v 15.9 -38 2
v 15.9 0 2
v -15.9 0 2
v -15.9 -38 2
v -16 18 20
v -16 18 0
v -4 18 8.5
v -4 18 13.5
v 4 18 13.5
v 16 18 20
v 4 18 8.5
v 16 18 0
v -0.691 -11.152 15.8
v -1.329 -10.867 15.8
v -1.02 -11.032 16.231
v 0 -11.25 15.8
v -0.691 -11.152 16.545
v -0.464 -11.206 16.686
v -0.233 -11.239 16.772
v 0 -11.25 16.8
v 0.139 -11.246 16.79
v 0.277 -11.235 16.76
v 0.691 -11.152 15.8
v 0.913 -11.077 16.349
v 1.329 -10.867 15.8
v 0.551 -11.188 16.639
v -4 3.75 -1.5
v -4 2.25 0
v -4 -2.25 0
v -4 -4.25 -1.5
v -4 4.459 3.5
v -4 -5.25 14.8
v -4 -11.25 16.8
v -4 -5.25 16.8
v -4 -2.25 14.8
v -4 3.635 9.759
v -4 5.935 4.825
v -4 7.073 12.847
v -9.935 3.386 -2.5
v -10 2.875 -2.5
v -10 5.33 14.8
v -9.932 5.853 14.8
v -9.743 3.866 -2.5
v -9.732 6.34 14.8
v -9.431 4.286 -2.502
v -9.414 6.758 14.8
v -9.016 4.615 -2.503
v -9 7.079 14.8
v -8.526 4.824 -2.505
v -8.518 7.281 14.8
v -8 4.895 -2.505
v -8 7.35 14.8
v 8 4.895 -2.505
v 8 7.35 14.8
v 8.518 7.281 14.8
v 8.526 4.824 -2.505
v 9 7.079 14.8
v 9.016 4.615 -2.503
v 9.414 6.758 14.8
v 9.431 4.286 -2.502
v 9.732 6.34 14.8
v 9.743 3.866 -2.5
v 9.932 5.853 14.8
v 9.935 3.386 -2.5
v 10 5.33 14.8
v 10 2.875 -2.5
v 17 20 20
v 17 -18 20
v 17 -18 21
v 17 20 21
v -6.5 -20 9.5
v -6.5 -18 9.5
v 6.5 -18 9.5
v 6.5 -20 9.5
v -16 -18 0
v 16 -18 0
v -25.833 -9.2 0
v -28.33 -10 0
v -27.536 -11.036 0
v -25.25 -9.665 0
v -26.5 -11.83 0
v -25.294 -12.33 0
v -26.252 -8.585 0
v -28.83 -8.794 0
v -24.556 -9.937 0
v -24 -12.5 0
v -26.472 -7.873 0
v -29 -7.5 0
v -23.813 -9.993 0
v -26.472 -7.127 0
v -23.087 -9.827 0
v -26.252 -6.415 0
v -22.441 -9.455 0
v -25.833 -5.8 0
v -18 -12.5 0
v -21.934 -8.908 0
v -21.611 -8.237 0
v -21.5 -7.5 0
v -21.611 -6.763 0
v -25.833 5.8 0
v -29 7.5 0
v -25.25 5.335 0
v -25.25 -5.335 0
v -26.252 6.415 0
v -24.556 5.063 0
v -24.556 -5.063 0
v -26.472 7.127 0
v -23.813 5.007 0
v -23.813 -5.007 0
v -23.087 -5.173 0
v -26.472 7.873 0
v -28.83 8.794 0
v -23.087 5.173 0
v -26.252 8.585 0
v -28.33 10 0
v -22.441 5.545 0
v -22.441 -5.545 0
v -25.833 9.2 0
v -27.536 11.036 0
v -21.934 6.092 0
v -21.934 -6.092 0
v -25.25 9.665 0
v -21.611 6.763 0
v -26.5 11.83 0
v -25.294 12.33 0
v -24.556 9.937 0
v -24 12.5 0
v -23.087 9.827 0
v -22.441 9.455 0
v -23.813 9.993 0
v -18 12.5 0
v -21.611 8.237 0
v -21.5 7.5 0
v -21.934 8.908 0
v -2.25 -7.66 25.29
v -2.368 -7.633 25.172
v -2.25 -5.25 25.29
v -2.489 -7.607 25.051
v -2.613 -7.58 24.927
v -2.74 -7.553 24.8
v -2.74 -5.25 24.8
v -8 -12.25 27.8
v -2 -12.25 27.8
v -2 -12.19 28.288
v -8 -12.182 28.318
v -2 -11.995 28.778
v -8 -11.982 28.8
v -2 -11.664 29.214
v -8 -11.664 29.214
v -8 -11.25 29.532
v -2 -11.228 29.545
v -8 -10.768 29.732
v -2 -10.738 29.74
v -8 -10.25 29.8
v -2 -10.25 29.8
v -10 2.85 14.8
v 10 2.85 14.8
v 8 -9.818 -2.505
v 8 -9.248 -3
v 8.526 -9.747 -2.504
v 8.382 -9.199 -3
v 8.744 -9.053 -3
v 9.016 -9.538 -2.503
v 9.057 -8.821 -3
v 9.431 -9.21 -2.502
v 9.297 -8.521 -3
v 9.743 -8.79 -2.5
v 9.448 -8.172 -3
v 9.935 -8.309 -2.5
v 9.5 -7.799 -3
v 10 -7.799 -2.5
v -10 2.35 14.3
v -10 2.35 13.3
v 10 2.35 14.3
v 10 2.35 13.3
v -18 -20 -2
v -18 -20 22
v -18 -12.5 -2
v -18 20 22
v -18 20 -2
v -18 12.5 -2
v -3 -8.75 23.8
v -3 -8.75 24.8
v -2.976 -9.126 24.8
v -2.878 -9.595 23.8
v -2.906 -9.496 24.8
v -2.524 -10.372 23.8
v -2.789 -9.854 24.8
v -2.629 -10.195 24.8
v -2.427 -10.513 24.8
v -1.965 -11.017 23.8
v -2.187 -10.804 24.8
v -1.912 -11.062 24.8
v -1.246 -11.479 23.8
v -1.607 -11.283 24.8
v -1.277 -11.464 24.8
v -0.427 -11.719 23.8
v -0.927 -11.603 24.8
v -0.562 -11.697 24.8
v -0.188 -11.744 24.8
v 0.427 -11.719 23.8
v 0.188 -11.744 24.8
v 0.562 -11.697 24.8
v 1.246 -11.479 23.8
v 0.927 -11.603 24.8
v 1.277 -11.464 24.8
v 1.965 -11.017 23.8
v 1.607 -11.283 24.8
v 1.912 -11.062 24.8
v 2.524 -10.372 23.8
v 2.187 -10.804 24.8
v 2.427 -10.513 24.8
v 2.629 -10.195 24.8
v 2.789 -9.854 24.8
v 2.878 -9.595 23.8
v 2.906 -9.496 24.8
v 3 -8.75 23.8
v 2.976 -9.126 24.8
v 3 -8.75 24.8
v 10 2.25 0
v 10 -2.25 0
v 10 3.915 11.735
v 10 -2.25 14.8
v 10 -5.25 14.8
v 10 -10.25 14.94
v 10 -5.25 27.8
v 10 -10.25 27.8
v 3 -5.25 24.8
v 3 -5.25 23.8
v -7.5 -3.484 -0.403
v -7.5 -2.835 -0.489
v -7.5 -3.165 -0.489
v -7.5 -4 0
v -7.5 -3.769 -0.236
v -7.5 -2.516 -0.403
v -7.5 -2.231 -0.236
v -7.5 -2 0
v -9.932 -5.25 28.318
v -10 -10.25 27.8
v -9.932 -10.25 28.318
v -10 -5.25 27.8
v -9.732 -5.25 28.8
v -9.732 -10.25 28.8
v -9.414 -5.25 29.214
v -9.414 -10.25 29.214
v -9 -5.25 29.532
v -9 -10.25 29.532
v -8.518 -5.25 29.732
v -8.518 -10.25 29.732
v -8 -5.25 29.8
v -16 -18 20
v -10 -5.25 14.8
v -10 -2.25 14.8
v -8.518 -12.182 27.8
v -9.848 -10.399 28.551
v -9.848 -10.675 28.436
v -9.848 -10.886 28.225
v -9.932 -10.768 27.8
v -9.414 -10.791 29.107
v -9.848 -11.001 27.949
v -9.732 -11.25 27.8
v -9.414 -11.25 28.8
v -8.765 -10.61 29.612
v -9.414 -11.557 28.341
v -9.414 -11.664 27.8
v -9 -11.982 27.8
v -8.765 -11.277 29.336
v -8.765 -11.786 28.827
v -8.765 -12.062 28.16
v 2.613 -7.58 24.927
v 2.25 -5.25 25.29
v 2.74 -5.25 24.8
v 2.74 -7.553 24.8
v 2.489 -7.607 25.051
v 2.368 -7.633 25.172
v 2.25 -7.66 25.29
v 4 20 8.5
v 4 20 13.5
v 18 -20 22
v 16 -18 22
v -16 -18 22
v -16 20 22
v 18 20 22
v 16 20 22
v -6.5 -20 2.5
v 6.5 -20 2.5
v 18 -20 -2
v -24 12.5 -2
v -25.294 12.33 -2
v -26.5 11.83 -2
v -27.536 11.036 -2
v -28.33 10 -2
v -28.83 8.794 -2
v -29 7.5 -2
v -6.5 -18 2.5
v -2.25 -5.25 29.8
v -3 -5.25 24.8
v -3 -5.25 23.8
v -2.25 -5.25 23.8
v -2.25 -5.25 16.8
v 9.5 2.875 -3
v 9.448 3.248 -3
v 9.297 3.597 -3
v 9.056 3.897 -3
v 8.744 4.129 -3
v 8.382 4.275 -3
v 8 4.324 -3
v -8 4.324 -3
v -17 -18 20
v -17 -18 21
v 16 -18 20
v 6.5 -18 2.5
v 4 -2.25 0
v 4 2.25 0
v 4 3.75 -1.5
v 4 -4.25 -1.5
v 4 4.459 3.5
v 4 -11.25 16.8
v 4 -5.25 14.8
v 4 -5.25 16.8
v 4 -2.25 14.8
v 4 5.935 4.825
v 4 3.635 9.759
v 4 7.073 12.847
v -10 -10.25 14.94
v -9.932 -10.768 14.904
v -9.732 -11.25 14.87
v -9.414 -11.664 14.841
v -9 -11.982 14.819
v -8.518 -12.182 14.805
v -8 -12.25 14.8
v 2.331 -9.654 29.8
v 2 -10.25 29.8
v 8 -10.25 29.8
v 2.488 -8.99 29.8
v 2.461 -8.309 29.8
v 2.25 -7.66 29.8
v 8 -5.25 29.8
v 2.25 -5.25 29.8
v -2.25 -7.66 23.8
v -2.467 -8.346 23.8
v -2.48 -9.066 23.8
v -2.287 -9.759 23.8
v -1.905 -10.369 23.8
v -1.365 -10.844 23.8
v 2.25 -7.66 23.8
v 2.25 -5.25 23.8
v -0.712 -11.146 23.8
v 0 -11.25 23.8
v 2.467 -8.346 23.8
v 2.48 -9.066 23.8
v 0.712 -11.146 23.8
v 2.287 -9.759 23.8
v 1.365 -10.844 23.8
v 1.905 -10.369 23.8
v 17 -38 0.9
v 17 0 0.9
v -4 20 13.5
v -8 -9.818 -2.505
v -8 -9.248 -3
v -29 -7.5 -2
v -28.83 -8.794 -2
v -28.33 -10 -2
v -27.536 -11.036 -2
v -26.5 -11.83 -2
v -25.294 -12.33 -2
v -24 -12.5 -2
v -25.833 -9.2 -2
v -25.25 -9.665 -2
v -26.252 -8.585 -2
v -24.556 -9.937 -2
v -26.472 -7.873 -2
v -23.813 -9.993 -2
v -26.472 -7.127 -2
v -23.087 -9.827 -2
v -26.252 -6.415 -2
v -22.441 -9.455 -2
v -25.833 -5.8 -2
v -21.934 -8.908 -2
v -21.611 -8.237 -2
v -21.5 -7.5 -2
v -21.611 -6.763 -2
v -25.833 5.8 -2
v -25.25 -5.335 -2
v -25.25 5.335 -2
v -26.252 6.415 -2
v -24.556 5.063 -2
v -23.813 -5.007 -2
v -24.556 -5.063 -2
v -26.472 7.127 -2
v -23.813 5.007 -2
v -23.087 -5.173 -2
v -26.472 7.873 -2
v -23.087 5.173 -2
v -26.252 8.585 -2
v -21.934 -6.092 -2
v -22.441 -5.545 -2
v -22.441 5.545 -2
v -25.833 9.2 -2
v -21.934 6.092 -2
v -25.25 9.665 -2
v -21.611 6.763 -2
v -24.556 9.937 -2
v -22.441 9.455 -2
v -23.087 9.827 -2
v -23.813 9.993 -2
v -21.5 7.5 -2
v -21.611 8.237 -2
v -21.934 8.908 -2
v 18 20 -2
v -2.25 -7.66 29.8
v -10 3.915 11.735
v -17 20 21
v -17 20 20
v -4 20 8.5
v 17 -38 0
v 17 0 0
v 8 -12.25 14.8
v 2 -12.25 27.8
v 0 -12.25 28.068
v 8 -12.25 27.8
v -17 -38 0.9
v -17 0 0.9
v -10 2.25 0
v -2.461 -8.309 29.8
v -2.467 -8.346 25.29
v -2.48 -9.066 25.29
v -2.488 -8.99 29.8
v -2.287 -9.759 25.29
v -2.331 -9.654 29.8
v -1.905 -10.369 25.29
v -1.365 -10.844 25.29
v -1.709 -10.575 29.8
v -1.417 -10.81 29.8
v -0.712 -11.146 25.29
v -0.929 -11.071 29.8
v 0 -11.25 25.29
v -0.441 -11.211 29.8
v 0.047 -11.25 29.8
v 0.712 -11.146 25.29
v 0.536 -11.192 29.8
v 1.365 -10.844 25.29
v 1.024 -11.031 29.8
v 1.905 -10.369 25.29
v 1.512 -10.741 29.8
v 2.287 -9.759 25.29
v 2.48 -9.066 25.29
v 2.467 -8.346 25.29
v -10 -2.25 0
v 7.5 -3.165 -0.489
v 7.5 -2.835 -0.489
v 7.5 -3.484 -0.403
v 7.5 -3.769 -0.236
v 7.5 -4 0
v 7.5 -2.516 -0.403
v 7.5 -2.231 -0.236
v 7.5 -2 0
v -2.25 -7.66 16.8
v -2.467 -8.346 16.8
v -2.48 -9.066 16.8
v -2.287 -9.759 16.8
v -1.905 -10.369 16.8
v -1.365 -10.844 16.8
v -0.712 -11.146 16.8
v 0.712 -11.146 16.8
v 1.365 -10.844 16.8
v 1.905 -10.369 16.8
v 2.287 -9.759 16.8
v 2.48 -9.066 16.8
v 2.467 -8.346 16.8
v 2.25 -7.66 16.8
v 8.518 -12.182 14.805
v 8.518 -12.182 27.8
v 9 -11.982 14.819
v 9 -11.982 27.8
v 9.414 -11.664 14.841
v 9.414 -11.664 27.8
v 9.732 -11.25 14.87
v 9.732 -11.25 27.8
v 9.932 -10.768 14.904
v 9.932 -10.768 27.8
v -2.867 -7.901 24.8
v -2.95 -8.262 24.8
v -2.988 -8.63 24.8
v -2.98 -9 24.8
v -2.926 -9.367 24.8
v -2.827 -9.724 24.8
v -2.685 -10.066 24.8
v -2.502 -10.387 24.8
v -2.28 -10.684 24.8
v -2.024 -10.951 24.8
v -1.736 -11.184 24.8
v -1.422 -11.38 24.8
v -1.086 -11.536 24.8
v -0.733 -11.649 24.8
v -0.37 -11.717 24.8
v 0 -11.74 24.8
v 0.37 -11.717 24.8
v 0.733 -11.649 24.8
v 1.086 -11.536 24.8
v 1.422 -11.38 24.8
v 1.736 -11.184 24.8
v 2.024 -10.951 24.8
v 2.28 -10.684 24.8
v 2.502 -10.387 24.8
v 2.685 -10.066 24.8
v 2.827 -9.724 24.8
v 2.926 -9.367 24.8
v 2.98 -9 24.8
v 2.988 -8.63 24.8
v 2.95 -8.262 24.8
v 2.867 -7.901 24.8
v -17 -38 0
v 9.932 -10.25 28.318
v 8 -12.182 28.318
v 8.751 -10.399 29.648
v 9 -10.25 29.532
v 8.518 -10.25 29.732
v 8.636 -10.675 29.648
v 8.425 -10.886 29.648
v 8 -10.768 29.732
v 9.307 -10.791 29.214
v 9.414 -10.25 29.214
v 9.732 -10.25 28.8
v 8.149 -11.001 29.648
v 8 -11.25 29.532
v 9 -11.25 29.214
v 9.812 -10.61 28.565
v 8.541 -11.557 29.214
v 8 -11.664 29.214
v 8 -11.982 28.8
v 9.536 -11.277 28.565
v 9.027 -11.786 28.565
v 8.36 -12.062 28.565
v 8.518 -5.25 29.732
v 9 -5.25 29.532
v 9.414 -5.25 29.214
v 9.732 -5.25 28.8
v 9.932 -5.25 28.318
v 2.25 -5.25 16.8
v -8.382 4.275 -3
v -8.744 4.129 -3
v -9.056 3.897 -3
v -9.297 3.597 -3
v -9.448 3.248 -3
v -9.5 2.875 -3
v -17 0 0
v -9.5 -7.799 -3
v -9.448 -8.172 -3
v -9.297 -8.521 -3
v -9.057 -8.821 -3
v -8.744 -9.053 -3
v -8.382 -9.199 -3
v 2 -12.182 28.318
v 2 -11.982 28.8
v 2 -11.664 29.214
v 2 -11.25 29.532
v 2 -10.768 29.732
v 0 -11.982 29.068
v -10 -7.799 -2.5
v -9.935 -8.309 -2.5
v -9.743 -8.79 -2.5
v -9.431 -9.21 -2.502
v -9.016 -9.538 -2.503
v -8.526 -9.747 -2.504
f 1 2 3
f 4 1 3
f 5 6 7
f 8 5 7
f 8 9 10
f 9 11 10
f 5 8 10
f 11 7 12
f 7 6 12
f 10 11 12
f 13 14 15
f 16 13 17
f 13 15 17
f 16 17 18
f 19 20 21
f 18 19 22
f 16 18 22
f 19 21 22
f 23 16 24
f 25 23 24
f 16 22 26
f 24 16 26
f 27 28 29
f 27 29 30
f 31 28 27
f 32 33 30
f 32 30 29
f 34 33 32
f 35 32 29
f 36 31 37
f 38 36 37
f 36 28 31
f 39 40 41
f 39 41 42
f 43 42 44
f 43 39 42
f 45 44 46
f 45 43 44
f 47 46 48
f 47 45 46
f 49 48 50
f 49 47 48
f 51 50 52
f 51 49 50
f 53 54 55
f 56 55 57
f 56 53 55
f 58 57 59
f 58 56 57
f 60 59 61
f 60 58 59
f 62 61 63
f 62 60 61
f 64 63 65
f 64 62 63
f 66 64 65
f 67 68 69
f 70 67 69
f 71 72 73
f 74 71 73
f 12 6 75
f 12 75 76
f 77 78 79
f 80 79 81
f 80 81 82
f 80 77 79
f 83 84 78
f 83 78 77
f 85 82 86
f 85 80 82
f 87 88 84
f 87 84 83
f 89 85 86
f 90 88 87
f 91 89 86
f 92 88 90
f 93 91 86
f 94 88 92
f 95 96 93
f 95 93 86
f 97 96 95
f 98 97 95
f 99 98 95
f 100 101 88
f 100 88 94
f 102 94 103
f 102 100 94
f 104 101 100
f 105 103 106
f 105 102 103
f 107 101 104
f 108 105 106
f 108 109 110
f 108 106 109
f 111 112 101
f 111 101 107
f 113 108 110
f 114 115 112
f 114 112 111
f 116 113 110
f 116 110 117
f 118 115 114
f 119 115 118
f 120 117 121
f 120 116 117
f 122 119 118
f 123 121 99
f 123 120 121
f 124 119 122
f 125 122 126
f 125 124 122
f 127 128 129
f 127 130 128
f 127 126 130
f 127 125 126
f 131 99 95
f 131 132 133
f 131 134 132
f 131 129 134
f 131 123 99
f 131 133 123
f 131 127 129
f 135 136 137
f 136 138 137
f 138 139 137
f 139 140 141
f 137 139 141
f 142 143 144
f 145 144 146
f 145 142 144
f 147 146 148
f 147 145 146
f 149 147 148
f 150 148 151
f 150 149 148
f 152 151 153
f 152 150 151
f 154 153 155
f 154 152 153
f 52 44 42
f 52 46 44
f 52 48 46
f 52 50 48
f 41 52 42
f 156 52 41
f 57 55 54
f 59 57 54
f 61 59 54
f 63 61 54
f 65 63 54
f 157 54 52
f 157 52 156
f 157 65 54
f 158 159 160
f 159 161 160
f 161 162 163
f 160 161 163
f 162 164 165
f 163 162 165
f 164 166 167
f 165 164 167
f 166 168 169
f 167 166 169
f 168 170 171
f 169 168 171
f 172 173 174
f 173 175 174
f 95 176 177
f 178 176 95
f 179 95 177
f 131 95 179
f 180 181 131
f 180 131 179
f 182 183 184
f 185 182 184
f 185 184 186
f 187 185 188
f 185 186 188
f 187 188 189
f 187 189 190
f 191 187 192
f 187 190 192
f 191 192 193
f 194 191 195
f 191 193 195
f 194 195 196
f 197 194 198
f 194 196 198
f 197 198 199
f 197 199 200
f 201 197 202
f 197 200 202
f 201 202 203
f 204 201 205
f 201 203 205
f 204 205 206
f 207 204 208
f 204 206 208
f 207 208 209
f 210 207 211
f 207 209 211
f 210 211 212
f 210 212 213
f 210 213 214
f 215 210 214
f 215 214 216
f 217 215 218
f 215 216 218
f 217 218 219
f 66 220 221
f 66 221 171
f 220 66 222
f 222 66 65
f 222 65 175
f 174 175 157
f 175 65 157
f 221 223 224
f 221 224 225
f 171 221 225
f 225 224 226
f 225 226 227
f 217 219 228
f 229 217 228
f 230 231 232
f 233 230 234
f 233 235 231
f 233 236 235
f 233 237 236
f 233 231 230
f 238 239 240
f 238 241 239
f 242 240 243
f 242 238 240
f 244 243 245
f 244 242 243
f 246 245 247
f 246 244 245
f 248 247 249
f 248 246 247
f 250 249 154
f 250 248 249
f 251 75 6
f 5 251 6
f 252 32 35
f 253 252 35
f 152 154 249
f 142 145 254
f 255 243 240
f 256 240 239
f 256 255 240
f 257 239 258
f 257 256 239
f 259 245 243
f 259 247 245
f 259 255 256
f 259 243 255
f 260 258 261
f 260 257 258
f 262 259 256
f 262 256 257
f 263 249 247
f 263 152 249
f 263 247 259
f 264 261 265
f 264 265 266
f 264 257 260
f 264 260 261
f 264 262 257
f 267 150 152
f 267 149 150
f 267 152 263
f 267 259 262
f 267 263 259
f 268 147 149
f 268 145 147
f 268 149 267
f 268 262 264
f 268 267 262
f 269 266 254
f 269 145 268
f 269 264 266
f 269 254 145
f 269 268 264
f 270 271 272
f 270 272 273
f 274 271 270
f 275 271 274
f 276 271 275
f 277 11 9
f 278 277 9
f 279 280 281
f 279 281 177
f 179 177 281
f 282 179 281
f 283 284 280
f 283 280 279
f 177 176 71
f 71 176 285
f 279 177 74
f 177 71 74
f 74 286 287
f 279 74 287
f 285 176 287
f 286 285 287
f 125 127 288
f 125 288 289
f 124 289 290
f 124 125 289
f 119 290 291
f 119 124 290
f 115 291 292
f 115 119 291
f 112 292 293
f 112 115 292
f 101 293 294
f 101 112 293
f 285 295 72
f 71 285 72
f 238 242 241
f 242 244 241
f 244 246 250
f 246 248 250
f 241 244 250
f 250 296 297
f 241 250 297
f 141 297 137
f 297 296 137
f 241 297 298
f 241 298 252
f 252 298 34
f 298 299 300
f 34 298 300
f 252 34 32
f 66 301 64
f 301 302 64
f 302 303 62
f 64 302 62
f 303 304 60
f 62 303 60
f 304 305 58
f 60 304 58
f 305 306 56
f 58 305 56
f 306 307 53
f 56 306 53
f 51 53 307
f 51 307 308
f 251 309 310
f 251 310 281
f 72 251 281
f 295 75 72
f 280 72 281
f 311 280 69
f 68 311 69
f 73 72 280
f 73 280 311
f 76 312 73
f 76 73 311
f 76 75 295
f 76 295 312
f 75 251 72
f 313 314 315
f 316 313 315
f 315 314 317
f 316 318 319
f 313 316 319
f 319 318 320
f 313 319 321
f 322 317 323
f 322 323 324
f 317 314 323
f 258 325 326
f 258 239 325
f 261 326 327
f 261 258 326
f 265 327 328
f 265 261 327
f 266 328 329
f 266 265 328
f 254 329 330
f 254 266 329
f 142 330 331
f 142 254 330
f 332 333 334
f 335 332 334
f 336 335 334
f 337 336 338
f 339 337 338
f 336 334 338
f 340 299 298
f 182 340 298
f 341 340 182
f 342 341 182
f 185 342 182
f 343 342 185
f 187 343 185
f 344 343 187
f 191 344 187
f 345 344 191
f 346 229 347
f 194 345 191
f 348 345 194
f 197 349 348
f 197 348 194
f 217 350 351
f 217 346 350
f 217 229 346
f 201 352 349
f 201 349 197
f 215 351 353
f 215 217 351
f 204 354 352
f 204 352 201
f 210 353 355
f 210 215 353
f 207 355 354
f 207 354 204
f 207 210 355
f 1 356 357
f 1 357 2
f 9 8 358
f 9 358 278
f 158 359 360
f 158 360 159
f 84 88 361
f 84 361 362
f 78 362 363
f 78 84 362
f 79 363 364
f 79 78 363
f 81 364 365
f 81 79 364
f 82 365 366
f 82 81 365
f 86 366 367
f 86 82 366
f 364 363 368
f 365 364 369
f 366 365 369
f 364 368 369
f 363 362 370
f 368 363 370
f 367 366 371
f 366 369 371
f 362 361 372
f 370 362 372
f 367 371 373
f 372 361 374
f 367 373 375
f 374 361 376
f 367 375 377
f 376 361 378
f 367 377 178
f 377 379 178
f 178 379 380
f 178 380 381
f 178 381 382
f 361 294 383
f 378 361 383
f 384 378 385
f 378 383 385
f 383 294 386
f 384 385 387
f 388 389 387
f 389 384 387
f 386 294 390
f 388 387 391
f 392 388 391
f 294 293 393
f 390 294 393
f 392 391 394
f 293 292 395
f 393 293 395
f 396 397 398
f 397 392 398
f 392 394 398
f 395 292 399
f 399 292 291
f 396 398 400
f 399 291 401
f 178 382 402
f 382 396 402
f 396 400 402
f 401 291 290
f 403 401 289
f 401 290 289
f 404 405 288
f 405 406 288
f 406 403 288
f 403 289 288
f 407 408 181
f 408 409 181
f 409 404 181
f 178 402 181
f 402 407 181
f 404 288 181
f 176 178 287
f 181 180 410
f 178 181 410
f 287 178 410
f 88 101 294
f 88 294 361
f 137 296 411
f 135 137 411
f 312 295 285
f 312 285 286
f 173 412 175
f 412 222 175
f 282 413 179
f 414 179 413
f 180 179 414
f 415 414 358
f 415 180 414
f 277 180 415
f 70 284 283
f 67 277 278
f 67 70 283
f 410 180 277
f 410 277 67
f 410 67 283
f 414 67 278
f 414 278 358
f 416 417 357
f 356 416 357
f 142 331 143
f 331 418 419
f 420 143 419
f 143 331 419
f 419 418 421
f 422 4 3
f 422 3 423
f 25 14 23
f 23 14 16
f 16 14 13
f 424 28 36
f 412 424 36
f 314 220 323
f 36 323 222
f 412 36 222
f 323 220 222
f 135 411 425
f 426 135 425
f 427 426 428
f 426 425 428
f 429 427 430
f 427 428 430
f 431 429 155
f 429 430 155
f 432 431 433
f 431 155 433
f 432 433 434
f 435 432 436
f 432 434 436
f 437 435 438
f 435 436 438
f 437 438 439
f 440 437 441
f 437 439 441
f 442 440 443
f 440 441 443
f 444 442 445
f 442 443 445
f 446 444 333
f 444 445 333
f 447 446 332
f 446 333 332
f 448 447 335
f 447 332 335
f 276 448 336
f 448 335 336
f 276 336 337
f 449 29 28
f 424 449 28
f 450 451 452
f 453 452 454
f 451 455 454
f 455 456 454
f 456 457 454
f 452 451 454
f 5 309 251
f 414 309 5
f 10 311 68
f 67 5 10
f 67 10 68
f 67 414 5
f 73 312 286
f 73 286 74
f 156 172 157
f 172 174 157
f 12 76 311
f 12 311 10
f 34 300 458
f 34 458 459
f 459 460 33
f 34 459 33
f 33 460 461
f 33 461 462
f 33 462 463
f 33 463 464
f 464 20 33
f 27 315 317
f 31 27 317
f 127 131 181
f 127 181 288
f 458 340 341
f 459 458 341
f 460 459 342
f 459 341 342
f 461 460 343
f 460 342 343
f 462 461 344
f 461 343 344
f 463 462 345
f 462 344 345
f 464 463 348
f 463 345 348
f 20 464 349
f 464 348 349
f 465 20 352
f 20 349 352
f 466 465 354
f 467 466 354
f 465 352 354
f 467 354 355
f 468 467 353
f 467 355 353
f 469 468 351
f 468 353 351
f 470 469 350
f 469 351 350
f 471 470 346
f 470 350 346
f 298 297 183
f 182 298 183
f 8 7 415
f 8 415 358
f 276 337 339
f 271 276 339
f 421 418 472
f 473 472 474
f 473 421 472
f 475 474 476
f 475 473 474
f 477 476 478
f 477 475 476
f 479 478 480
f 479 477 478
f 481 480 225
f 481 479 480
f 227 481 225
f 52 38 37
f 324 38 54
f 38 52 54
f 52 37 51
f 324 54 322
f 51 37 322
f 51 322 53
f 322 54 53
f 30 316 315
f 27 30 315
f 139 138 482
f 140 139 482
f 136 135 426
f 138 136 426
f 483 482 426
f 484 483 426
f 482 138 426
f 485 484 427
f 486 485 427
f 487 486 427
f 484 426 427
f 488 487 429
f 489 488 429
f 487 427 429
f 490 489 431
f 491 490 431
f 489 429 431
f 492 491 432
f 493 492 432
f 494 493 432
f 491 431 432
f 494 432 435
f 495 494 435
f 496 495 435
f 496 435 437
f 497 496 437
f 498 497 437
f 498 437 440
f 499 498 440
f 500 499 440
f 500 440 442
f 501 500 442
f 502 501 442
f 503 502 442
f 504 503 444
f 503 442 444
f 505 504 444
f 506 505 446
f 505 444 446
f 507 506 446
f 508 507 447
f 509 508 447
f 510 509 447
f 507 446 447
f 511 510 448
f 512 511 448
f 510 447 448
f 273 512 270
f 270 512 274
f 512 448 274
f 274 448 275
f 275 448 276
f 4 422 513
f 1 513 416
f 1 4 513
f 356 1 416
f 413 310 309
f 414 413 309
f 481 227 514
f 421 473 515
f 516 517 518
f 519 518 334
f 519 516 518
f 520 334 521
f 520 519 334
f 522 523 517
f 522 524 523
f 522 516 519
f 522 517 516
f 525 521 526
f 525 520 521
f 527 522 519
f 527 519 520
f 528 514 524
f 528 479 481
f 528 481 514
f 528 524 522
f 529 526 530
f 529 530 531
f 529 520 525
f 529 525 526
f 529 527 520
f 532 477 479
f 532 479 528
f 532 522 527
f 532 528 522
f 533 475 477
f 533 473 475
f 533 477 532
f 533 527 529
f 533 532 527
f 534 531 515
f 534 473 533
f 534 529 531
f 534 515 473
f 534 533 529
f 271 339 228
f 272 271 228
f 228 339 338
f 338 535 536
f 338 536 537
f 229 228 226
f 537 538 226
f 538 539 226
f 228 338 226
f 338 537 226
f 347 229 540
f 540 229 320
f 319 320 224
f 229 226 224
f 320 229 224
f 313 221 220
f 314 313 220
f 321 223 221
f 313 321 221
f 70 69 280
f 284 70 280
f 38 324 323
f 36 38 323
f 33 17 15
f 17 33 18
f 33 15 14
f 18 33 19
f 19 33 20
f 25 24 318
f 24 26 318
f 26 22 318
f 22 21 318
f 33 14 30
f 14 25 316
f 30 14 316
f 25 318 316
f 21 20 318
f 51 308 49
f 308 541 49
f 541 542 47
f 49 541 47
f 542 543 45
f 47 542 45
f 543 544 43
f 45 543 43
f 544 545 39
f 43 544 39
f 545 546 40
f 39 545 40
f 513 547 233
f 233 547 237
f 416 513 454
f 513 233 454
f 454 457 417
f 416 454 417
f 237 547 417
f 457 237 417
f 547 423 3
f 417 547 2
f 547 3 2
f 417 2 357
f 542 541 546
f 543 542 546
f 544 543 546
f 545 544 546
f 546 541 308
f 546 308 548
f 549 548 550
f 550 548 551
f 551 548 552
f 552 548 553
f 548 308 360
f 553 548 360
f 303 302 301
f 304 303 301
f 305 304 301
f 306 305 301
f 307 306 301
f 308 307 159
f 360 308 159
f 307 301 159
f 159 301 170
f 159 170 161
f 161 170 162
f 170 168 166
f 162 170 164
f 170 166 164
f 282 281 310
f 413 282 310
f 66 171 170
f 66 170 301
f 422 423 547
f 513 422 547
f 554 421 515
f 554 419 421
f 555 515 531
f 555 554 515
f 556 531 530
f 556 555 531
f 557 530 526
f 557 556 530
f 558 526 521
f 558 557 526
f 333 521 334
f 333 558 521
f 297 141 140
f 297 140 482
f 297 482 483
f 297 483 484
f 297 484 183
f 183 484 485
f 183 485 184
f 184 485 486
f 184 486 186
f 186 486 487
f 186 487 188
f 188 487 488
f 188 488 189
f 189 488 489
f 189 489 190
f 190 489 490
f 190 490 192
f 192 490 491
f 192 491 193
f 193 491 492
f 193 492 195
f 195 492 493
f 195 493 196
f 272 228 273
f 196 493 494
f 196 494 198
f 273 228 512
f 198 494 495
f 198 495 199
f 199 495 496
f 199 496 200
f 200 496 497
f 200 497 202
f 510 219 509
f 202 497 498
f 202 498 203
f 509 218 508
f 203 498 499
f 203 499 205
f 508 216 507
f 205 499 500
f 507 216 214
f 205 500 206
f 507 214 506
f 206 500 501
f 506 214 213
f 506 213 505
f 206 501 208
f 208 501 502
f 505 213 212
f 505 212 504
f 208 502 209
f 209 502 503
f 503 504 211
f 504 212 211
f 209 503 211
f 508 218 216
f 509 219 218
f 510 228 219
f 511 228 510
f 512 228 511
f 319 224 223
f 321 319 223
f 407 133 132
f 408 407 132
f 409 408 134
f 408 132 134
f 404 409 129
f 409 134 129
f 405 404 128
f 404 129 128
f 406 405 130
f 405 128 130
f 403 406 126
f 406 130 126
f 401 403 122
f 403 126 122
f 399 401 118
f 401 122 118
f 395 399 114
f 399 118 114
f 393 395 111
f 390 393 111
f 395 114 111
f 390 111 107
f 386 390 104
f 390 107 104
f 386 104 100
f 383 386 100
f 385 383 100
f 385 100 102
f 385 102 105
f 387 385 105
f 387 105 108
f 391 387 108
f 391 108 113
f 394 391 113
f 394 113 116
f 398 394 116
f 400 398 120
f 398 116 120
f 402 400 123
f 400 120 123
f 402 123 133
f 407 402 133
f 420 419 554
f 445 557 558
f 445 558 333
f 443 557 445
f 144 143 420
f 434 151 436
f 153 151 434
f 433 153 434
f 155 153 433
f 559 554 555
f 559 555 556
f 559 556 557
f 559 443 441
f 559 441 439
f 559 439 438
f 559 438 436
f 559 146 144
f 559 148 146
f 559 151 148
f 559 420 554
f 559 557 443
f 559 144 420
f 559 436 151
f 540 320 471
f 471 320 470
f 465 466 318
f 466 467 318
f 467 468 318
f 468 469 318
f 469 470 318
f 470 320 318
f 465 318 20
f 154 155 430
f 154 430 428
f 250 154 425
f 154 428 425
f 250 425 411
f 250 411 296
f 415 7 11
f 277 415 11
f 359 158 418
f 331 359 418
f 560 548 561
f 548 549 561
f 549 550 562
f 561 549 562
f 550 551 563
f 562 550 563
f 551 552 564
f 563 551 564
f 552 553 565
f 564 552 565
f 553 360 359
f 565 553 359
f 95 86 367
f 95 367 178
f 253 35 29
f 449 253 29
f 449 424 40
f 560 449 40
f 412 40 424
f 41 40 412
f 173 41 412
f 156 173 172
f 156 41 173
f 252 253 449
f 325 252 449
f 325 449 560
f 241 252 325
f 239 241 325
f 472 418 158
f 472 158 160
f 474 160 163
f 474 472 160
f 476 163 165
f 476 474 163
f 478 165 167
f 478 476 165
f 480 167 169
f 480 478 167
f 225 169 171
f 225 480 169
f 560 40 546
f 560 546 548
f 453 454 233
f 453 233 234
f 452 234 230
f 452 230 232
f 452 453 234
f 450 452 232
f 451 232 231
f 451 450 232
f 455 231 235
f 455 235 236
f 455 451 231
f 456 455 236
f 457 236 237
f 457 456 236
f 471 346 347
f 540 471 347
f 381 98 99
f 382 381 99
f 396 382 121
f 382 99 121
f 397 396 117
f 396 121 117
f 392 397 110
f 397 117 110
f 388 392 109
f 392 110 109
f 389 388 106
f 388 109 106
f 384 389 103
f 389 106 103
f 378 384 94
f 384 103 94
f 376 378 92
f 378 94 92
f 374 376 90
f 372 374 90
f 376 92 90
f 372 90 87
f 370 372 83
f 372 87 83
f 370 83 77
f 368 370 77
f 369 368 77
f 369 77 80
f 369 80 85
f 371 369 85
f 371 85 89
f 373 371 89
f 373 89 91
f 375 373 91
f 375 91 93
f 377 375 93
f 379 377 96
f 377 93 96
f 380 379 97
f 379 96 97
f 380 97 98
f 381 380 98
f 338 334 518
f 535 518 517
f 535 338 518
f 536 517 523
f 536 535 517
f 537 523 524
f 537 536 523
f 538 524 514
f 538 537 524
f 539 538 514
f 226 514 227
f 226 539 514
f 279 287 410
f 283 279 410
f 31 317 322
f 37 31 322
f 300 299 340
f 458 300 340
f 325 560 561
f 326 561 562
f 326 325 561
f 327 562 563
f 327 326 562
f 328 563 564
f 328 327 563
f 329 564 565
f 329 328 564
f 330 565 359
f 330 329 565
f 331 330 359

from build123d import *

# Parameters (mm, degrees)
PAD_DEPTH       = 10
POCKET_DEPTH    = 14
POCKET001_DEPTH = 1
POCKET002_DEPTH = 4
FILLET_R        = 2
CHAMFER_SIZE    = 0.5
CHAMFER001_SIZE = 0.49
SKETCH005_W     = 32
SKETCH005_H     = 36
PAD001_DEPTH    = 22
THICKNESS_T     = 2
SKETCH006_W     = 13
SKETCH006_H     = 7
POCKET003_DEPTH = 20.001
SKETCH007_W     = 8
SKETCH007_H     = 5
POCKET004_DEPTH = 20.001
POCKET005_DEPTH = 38
SKETCH009_R     = 2.5
PAD002_DEPTH    = 2
PAD003_DEPTH    = 38
PAD004_DEPTH    = 7.5


with BuildPart() as body:
    # Sketch → Pad (new body, symmetric)
    with BuildSketch(Plane.YZ):
        Polygon((-2.25, 14.8), (-2.25, 0), (2.25, 0), (3.915089, 11.734911), (2.35, 13.3), (2.35, 14.3), (2.85, 14.8), (4.35, 14.8), (7.35, 14.8), (4.824324, -3), (-9.748373, -3), (-12.25, 14.8), (-12.25, 29.8), (-5.25, 29.8), (-5.25, 14.8), align=None)
    extrude(amount=PAD_DEPTH, both=True)

    # Sketch001 (on Face13 of Pad) → Pocket (cut)
    with BuildSketch(Plane(origin=(0, 0, 29.8), x_dir=(0, -1, 0), z_dir=(0, 0, 1))):
        with BuildLine():
            Line((3.160275, 2.25), (3.160275, -2.25))
            Line((3.160275, -2.25), (7.660275, -2.25))
            ThreePointArc((7.660275, -2.25), (11.25, 0), (7.660275, 2.25))
            Line((7.660275, 2.25), (3.160275, 2.25))
        make_face()
    extrude(amount=-POCKET_DEPTH, mode=Mode.SUBTRACT)

    # Sketch002 (on Face13 of Pad) → Pocket001 (cut)
    with BuildSketch(Plane(origin=(0, 0, 24.8), x_dir=(0, -1, 0), z_dir=(0, 0, 1))):
        with BuildLine():
            Line((0.75, 3), (0.75, -3))
            Line((0.75, -3), (8.75, -3))
            ThreePointArc((8.75, -3), (11.75, 0), (8.75, 3))
            Line((8.75, 3), (0.75, 3))
        make_face()
    extrude(amount=-POCKET001_DEPTH, mode=Mode.SUBTRACT)

    # Sketch003 → Pocket002 (cut, symmetric)
    with BuildSketch(Plane.YZ):
        Polygon((12.35, 17.585771), (1.25, 7.617879), (-1.25, 7.617879), (-1.25, 16.8), (-11.25, 16.8), (-4.25, -1.5), (3.75, -1.5), (4.459459, 3.5), (12.35, 10.585771), align=None)
    extrude(amount=POCKET002_DEPTH, both=True, mode=Mode.SUBTRACT)

    # Fillet
    fillet_edges = [body.edges().sort_by_distance(p)[0] for p in [
        (10, -10.999187, 5.9),
        (10, -12.25, 22.3),
        (10, -8.75, 29.8),
        (0, -12.25, 29.8),
        (-10, -8.75, 29.8),
        (-10, -12.25, 22.3),
        (-10, -10.999187, 5.9),
        (10, 6.087162, 5.9),
        (-10, 6.087162, 5.9),
    ]]
    fillet(fillet_edges, radius=FILLET_R)

    # Chamfer
    chamfer_edges = [body.edges().sort_by_distance(p)[0] for p in [
        (0, 4.824324, -3),
        (-9.417733, 4.229107, -3),
        (9.417733, 4.229107, -3),
        (-10, -2.462213, -3),
        (10, -2.462213, -3),
        (-9.417667, -9.153334, -3),
        (9.417667, -9.153334, -3),
        (0, -9.748373, -3),
    ]]
    chamfer(chamfer_edges, length=CHAMFER_SIZE)

    # Chamfer001
    chamfer001_edges = [body.edges().sort_by_distance(p)[0] for p in [
        (-2.25, -6.455138, 24.8),
        (0, -11.25, 24.8),
        (2.25, -6.455138, 24.8),
    ]]
    chamfer(chamfer001_edges, length=CHAMFER001_SIZE)


with BuildPart() as boxbody:
    # Sketch005 → Pad001 (new body)
    with BuildSketch(Plane.XY):
        Rectangle(SKETCH005_W, SKETCH005_H)
    extrude(amount=PAD001_DEPTH)

    # Thickness
    thickness_openings = [boxbody.faces().sort_by_distance(p)[0] for p in [
        (0, 0, 22),
    ]]
    offset(amount=THICKNESS_T, openings=thickness_openings, kind=Kind.INTERSECTION)

    # Sketch006 → Pocket003 (cut, through all)
    with BuildSketch(Plane.XZ):
        with Locations((0, 6)):
            Rectangle(SKETCH006_W, SKETCH006_H)
    extrude(amount=POCKET003_DEPTH, mode=Mode.SUBTRACT)

    # Sketch007 → Pocket004 (cut, through all)
    with BuildSketch(Plane.XZ):
        with Locations((0, 11)):
            Rectangle(SKETCH007_W, SKETCH007_H)
    extrude(amount=-POCKET004_DEPTH, mode=Mode.SUBTRACT)

    # Sketch008 (on Face11 of Pocket004) → Pocket005 (cut)
    with BuildSketch(Plane(origin=(0, 20, 0), x_dir=(-1, 0, 0), z_dir=(0, 1, 0))):
        Polygon((-16, 22), (16, 22), (17, 21), (17, 20), (-17, 20), (-17, 21), align=None)
    extrude(amount=-POCKET005_DEPTH, mode=Mode.SUBTRACT)

    # Sketch009 → Pad002 (join)
    with BuildSketch(Plane.XY):
        with BuildLine():
            Line((-29, 7.5), (-29, -7.5))
            ThreePointArc((-29, -7.5), (-27.535534, -11.035534), (-24, -12.5))
            Line((-24, -12.5), (-14, -12.5))
            Line((-14, -12.5), (-14, 12.5))
            Line((-14, 12.5), (-24, 12.5))
            ThreePointArc((-24, 12.5), (-27.535534, 11.035534), (-29, 7.5))
        make_face()
        with Locations((-24, 7.5)):
            Circle(SKETCH009_R, mode=Mode.SUBTRACT)
        with Locations((-24, -7.5)):
            Circle(SKETCH009_R, mode=Mode.SUBTRACT)
    extrude(amount=-PAD002_DEPTH)


with BuildPart() as coverbody:
    # Sketch010 → Pad003 (new body)
    with BuildSketch(Plane.XZ):
        Polygon((-17, 0), (17, 0), (17, 0.9), (15.9, 2), (-15.9, 2), (-17, 0.9), align=None)
    extrude(amount=PAD003_DEPTH)

    # Sketch011 → Pad004 (join, symmetric)
    with BuildSketch(Plane.YZ):
        with BuildLine():
            Line((-4, 0), (-2, 0))
            ThreePointArc((-4, 0), (-3, -0.5), (-2, 0))
        make_face()
    extrude(amount=PAD004_DEPTH, both=True)


solid = Compound([body.part, boxbody.part, coverbody.part])
